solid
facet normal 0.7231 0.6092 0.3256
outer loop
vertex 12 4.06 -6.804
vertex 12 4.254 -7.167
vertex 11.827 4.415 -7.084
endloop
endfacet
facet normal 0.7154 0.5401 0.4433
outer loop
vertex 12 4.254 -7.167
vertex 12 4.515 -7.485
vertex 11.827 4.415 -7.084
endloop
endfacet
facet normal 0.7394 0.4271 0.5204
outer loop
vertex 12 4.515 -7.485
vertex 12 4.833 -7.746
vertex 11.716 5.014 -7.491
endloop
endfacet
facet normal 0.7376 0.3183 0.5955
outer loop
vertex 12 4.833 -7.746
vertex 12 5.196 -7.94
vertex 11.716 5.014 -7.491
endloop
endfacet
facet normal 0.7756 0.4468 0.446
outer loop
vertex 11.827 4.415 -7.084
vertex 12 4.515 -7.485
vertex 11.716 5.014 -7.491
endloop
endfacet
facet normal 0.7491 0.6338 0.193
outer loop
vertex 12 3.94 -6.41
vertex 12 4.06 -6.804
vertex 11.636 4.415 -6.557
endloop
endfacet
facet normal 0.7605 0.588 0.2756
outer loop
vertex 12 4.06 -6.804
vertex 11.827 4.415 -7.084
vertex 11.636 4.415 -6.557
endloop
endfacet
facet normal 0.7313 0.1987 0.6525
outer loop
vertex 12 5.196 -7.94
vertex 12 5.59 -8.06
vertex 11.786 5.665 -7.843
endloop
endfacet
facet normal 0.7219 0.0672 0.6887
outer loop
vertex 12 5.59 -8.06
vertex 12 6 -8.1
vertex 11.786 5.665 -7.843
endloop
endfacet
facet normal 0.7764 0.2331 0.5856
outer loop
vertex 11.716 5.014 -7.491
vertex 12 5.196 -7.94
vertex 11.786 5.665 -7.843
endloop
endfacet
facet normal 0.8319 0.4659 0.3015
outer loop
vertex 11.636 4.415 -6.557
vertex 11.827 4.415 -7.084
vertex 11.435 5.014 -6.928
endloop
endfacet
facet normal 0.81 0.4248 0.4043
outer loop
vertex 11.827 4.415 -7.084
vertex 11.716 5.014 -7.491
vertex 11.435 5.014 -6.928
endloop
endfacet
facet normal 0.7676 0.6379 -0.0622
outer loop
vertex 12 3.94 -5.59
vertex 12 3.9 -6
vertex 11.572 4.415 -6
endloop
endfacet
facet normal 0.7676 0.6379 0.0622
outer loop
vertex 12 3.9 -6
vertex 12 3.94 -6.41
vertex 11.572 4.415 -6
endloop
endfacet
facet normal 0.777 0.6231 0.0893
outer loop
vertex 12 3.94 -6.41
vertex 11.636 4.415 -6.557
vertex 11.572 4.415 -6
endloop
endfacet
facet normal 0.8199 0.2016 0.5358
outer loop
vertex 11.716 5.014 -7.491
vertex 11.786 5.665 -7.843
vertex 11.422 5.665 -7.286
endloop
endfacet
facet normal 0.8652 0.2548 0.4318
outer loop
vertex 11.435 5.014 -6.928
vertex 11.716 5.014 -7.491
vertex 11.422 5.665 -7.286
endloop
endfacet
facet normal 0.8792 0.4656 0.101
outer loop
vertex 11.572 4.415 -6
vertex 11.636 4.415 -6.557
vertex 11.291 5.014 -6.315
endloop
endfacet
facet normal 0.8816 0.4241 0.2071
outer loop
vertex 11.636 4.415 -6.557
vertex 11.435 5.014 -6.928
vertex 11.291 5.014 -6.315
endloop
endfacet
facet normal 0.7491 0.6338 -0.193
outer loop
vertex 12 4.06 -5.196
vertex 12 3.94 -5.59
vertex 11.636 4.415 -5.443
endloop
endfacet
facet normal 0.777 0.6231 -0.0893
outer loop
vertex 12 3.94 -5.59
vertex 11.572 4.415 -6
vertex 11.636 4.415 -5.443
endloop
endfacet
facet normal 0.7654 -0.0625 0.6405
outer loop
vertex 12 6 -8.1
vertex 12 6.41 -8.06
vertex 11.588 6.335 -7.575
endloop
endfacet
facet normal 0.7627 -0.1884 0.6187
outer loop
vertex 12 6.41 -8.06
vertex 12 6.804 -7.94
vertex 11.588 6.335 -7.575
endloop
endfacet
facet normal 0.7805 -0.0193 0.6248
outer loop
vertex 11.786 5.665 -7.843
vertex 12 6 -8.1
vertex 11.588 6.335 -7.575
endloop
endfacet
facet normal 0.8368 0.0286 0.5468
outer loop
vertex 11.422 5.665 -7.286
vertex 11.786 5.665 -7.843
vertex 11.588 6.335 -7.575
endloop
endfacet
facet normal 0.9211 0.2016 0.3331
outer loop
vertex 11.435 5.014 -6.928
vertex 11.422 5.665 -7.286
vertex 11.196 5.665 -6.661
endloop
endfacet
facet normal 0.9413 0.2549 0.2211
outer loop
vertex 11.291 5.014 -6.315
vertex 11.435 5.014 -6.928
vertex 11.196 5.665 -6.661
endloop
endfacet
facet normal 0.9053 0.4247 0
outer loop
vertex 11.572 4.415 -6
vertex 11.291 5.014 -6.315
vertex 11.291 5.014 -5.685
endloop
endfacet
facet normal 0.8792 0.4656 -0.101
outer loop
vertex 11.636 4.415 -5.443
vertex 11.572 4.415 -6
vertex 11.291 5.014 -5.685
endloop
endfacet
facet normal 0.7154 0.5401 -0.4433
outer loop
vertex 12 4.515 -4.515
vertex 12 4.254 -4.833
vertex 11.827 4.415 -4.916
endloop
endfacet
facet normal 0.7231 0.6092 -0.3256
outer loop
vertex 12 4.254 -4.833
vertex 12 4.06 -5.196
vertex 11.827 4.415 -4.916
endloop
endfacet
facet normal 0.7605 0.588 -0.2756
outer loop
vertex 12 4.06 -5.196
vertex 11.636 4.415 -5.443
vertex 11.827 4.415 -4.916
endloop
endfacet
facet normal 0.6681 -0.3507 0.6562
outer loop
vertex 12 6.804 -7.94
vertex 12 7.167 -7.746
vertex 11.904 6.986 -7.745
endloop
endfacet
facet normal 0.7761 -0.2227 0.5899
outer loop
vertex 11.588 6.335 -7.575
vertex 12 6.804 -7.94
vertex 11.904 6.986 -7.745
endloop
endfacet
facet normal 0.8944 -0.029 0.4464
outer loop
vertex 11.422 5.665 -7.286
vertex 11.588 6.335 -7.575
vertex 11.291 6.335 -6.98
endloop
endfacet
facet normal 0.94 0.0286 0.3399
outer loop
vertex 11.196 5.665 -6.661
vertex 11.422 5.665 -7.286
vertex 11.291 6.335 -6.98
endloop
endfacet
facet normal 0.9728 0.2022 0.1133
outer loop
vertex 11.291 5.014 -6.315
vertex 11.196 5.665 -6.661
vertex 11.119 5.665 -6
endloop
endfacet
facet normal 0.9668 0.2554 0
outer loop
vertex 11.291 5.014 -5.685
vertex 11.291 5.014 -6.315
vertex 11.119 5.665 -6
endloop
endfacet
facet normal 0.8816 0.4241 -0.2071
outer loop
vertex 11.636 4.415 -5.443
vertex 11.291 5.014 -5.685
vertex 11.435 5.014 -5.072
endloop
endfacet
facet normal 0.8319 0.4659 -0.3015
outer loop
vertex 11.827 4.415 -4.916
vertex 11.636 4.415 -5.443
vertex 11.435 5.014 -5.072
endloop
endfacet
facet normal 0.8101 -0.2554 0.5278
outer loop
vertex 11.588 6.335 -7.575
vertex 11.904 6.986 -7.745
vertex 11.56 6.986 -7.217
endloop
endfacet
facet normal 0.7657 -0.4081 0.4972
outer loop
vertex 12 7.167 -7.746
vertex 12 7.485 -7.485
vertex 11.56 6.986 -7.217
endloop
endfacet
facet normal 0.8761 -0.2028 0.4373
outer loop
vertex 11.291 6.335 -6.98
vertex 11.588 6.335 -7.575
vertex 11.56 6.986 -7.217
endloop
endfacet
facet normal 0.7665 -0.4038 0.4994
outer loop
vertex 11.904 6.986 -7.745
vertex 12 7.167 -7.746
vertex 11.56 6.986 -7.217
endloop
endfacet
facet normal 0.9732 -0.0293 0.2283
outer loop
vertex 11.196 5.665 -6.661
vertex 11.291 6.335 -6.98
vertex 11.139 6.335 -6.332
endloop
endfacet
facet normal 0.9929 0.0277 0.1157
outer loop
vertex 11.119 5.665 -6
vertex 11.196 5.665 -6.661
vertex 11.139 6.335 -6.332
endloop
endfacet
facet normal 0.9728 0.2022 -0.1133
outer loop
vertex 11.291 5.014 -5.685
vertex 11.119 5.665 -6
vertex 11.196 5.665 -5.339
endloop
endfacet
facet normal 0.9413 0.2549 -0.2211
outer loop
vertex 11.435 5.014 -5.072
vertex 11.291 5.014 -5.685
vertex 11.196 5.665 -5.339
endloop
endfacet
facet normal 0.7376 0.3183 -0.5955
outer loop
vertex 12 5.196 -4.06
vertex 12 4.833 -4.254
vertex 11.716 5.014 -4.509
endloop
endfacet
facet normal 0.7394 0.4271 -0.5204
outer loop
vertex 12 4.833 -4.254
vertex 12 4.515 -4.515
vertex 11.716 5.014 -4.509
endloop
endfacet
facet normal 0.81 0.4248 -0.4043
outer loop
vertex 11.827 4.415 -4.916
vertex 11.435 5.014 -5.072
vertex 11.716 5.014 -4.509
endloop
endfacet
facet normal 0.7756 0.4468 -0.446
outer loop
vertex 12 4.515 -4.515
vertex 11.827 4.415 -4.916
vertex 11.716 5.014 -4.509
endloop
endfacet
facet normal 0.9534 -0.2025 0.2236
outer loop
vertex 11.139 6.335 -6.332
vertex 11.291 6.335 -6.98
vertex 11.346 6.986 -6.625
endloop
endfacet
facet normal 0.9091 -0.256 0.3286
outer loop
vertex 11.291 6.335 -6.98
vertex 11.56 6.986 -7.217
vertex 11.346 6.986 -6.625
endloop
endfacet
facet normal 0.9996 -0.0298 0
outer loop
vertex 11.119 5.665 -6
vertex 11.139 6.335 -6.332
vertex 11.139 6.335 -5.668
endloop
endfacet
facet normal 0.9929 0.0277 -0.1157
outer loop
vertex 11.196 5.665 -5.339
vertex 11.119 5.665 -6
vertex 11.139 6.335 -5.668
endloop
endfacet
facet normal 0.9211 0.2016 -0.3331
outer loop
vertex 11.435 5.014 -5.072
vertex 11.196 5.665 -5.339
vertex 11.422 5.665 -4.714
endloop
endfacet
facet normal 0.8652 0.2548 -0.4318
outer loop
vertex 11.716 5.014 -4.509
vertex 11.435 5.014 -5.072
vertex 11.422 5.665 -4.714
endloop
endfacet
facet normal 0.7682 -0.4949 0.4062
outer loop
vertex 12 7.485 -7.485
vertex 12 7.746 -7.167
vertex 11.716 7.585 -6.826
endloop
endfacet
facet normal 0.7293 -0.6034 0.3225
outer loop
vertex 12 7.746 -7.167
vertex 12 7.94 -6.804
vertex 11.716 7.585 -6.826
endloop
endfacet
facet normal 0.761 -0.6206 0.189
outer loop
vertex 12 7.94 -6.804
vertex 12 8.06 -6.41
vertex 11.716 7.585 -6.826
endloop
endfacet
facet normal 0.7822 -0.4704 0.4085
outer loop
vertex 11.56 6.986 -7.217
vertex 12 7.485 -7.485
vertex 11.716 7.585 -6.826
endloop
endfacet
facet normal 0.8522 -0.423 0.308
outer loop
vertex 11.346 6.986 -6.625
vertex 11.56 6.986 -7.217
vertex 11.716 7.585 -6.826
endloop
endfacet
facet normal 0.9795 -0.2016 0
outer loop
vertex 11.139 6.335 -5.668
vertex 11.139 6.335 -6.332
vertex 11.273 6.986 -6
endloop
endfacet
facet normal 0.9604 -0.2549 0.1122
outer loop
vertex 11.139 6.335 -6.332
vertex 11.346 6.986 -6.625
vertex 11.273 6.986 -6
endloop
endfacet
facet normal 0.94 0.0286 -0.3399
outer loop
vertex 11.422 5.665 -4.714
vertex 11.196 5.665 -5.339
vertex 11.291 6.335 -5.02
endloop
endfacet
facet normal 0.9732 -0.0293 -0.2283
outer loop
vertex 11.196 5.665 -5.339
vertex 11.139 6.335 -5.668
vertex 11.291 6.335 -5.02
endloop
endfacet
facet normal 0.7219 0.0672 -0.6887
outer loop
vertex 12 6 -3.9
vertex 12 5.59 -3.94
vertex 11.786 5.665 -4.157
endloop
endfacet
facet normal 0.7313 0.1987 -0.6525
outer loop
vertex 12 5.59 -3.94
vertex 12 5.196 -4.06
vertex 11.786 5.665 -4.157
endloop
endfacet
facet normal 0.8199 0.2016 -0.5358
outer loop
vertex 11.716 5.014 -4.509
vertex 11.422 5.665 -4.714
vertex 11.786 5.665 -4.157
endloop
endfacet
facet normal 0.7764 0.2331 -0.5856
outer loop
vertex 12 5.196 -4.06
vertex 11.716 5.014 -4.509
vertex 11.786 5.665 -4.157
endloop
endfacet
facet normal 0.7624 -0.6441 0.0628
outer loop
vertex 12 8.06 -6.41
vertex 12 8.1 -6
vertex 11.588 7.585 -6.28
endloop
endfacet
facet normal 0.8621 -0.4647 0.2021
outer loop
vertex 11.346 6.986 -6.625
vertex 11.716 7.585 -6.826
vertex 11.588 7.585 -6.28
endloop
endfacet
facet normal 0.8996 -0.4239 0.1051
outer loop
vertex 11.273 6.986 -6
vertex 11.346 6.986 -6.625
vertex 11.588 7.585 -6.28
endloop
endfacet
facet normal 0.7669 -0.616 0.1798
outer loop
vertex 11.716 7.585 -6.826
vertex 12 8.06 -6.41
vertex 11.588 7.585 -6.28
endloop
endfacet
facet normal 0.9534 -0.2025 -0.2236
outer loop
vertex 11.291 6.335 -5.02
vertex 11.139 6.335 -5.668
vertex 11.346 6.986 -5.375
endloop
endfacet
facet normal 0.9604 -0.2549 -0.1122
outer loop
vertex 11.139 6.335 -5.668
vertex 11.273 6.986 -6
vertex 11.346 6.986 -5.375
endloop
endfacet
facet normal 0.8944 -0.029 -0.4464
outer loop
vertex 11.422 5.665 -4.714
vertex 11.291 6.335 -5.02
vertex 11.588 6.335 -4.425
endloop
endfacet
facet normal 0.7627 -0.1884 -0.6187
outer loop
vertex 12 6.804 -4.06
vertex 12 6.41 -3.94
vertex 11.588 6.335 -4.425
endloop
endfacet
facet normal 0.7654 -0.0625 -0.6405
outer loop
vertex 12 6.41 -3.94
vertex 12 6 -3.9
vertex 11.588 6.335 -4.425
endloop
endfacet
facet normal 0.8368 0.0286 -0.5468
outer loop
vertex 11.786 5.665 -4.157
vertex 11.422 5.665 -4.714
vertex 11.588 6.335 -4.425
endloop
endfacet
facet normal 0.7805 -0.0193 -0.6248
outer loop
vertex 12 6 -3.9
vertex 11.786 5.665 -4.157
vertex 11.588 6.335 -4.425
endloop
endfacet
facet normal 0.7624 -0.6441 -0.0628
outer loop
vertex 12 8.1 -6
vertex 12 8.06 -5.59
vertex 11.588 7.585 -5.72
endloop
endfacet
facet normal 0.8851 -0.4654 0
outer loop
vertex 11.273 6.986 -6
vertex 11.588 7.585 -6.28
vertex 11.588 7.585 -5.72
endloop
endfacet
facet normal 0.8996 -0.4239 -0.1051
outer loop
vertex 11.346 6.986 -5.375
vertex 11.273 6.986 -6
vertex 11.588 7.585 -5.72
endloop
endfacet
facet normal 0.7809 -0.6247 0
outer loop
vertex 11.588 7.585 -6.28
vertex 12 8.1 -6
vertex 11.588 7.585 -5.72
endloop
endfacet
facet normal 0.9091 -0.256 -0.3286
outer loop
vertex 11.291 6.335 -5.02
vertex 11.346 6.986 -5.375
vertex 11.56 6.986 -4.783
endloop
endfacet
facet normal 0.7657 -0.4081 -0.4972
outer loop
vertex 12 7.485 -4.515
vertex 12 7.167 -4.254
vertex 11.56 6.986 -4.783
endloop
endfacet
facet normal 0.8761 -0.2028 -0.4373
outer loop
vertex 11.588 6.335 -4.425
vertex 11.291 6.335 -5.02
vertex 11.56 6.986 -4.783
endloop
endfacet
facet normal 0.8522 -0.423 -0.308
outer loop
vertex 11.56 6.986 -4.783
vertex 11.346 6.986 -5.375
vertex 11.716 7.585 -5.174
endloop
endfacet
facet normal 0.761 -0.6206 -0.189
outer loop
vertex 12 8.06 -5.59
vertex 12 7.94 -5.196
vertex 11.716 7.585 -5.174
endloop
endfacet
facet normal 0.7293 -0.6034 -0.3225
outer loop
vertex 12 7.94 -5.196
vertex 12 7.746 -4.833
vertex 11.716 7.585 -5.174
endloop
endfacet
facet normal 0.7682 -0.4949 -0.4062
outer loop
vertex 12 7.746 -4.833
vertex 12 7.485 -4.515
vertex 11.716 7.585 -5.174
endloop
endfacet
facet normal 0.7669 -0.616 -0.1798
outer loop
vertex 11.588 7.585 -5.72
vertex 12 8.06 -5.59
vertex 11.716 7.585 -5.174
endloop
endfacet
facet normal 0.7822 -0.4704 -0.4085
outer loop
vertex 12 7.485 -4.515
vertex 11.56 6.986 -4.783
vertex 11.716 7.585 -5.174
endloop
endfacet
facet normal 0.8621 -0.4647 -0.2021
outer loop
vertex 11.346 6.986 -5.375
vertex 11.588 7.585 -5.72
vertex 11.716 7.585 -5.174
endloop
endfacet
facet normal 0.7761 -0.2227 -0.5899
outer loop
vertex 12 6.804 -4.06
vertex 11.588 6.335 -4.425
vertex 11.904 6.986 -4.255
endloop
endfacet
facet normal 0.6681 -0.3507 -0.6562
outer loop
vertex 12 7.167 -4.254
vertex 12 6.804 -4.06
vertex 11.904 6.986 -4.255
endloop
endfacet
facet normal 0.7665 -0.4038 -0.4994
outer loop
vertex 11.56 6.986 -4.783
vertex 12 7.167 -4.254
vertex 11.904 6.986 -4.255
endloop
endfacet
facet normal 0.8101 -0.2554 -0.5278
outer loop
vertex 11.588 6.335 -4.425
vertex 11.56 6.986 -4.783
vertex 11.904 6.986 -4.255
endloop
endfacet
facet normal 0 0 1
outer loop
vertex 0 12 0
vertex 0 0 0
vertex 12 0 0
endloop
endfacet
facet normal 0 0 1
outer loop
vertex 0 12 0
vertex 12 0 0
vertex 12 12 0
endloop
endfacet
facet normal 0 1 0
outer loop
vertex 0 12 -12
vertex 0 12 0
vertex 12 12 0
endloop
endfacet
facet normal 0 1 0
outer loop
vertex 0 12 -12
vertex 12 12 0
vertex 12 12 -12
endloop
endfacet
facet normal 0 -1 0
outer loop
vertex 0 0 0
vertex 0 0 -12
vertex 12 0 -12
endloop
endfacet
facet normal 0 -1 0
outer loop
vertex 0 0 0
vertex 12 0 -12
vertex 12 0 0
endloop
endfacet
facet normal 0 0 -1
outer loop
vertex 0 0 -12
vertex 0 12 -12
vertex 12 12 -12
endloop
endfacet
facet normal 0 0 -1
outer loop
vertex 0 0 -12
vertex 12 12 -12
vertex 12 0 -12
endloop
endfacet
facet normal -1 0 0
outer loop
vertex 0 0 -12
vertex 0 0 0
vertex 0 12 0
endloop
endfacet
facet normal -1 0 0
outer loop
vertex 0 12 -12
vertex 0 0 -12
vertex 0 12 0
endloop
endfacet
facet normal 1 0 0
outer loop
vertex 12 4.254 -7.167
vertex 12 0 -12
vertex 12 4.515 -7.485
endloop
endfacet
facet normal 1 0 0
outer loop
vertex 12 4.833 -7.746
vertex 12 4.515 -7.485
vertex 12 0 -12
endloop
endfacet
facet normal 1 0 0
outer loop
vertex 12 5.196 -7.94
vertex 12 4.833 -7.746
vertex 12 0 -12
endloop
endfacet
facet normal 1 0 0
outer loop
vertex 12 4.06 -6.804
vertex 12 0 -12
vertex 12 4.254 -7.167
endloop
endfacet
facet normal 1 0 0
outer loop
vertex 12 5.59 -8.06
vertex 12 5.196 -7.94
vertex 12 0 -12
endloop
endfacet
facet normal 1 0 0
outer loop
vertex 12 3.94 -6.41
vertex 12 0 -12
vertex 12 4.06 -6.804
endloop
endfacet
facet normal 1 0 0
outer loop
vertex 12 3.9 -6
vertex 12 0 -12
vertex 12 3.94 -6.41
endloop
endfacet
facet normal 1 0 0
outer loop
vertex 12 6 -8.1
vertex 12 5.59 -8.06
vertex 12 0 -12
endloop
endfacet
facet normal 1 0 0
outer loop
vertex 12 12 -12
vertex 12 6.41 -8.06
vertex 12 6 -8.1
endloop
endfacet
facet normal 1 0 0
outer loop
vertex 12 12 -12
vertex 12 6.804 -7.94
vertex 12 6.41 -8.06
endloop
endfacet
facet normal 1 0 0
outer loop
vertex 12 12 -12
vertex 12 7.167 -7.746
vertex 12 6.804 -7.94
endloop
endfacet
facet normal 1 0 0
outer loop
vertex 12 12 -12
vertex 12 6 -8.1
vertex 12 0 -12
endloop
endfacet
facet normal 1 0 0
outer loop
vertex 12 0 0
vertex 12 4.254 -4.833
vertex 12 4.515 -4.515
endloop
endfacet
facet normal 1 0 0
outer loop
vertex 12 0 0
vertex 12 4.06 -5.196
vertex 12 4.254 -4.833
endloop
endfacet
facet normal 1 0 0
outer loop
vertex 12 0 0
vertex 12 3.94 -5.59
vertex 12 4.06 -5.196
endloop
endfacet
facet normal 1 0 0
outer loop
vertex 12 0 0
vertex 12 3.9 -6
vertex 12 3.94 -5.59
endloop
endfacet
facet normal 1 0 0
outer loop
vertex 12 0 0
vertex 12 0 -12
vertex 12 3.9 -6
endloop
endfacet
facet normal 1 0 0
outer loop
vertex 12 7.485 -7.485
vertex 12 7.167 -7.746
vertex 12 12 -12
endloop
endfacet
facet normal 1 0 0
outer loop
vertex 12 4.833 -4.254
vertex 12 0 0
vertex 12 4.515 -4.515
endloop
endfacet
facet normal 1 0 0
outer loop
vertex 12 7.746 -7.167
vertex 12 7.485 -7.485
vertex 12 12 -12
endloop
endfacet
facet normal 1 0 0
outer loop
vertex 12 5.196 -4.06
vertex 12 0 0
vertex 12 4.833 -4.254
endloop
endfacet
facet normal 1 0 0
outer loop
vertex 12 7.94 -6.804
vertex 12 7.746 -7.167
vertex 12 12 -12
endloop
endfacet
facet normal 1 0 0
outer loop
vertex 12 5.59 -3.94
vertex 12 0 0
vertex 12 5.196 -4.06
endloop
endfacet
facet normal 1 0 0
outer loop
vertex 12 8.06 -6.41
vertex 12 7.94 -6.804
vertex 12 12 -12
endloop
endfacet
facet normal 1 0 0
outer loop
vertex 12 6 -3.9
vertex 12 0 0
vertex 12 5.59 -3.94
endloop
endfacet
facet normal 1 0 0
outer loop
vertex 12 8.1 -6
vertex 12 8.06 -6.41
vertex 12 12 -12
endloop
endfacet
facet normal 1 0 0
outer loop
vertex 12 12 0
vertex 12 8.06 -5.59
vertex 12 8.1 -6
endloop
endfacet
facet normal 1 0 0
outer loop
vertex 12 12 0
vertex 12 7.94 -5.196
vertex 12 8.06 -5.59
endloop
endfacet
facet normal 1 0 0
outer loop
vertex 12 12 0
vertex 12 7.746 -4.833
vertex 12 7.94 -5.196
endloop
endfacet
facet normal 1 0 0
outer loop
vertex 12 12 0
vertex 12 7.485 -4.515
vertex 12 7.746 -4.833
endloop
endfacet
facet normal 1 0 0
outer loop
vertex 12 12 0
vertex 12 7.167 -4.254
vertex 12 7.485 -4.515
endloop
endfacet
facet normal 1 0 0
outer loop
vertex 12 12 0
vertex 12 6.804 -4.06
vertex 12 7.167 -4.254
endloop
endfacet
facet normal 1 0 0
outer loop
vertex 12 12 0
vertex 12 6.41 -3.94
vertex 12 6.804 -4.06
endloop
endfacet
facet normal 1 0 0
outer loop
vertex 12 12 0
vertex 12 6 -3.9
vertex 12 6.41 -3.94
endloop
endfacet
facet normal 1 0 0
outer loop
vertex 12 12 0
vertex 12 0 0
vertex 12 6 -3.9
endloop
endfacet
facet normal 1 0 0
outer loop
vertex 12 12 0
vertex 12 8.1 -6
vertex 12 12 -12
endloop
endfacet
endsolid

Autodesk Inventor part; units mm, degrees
ref_plane "YZ Plane" through (0, 0, 0) normal (1, 0, 0) x (0, 1, 0)
ref_plane "XZ Plane" through (0, 0, 0) normal (0, 1, 0) x (-1, 0, 0)
ref_plane "XY Plane" through (0, 0, 0) normal (0, 0, 1) x (1, 0, 0)
sketch "Sketch1" plane through (0, 0, 0) normal (1, 0, 0) x (0, 1, 0)
  line L0 (0, 0) -> (12, 0)
  line L1 (12, 0) -> (12, -12)
  line L2 (12, -12) -> (0, -12)
  line L3 (0, -12) -> (0, 0)
  dimension "d0" = 12
  dimension "d1" = 12
extrude "Extrusion1" add sketch "Sketch1" along normal blind 12
ref_plane "Work Plane1" through (14, 0, 0) normal (1, 0, 0) x (0, 0, -1)
sketch "Sketch2" plane through (14, 0, 0) normal (1, 0, 0) x (0, 0, -1)
  arc A0 (6, 3.1) -> (6, 8.9) centre (6, 6) ccw
  line L0 (6, 6) -> (6, 8.9)
  line L1 (6, 6) -> (6, 3.1)
  point P0 (0, 0)
  dimension "d5" = 5.8
  dimension "d6" = 6
  dimension "d7" = 6
revolve "Revolution1" cut sketch "Sketch2" angle 360 about axis through (14, 6, -6) along (0, 1, 0)
properties part number "test_part_01"
